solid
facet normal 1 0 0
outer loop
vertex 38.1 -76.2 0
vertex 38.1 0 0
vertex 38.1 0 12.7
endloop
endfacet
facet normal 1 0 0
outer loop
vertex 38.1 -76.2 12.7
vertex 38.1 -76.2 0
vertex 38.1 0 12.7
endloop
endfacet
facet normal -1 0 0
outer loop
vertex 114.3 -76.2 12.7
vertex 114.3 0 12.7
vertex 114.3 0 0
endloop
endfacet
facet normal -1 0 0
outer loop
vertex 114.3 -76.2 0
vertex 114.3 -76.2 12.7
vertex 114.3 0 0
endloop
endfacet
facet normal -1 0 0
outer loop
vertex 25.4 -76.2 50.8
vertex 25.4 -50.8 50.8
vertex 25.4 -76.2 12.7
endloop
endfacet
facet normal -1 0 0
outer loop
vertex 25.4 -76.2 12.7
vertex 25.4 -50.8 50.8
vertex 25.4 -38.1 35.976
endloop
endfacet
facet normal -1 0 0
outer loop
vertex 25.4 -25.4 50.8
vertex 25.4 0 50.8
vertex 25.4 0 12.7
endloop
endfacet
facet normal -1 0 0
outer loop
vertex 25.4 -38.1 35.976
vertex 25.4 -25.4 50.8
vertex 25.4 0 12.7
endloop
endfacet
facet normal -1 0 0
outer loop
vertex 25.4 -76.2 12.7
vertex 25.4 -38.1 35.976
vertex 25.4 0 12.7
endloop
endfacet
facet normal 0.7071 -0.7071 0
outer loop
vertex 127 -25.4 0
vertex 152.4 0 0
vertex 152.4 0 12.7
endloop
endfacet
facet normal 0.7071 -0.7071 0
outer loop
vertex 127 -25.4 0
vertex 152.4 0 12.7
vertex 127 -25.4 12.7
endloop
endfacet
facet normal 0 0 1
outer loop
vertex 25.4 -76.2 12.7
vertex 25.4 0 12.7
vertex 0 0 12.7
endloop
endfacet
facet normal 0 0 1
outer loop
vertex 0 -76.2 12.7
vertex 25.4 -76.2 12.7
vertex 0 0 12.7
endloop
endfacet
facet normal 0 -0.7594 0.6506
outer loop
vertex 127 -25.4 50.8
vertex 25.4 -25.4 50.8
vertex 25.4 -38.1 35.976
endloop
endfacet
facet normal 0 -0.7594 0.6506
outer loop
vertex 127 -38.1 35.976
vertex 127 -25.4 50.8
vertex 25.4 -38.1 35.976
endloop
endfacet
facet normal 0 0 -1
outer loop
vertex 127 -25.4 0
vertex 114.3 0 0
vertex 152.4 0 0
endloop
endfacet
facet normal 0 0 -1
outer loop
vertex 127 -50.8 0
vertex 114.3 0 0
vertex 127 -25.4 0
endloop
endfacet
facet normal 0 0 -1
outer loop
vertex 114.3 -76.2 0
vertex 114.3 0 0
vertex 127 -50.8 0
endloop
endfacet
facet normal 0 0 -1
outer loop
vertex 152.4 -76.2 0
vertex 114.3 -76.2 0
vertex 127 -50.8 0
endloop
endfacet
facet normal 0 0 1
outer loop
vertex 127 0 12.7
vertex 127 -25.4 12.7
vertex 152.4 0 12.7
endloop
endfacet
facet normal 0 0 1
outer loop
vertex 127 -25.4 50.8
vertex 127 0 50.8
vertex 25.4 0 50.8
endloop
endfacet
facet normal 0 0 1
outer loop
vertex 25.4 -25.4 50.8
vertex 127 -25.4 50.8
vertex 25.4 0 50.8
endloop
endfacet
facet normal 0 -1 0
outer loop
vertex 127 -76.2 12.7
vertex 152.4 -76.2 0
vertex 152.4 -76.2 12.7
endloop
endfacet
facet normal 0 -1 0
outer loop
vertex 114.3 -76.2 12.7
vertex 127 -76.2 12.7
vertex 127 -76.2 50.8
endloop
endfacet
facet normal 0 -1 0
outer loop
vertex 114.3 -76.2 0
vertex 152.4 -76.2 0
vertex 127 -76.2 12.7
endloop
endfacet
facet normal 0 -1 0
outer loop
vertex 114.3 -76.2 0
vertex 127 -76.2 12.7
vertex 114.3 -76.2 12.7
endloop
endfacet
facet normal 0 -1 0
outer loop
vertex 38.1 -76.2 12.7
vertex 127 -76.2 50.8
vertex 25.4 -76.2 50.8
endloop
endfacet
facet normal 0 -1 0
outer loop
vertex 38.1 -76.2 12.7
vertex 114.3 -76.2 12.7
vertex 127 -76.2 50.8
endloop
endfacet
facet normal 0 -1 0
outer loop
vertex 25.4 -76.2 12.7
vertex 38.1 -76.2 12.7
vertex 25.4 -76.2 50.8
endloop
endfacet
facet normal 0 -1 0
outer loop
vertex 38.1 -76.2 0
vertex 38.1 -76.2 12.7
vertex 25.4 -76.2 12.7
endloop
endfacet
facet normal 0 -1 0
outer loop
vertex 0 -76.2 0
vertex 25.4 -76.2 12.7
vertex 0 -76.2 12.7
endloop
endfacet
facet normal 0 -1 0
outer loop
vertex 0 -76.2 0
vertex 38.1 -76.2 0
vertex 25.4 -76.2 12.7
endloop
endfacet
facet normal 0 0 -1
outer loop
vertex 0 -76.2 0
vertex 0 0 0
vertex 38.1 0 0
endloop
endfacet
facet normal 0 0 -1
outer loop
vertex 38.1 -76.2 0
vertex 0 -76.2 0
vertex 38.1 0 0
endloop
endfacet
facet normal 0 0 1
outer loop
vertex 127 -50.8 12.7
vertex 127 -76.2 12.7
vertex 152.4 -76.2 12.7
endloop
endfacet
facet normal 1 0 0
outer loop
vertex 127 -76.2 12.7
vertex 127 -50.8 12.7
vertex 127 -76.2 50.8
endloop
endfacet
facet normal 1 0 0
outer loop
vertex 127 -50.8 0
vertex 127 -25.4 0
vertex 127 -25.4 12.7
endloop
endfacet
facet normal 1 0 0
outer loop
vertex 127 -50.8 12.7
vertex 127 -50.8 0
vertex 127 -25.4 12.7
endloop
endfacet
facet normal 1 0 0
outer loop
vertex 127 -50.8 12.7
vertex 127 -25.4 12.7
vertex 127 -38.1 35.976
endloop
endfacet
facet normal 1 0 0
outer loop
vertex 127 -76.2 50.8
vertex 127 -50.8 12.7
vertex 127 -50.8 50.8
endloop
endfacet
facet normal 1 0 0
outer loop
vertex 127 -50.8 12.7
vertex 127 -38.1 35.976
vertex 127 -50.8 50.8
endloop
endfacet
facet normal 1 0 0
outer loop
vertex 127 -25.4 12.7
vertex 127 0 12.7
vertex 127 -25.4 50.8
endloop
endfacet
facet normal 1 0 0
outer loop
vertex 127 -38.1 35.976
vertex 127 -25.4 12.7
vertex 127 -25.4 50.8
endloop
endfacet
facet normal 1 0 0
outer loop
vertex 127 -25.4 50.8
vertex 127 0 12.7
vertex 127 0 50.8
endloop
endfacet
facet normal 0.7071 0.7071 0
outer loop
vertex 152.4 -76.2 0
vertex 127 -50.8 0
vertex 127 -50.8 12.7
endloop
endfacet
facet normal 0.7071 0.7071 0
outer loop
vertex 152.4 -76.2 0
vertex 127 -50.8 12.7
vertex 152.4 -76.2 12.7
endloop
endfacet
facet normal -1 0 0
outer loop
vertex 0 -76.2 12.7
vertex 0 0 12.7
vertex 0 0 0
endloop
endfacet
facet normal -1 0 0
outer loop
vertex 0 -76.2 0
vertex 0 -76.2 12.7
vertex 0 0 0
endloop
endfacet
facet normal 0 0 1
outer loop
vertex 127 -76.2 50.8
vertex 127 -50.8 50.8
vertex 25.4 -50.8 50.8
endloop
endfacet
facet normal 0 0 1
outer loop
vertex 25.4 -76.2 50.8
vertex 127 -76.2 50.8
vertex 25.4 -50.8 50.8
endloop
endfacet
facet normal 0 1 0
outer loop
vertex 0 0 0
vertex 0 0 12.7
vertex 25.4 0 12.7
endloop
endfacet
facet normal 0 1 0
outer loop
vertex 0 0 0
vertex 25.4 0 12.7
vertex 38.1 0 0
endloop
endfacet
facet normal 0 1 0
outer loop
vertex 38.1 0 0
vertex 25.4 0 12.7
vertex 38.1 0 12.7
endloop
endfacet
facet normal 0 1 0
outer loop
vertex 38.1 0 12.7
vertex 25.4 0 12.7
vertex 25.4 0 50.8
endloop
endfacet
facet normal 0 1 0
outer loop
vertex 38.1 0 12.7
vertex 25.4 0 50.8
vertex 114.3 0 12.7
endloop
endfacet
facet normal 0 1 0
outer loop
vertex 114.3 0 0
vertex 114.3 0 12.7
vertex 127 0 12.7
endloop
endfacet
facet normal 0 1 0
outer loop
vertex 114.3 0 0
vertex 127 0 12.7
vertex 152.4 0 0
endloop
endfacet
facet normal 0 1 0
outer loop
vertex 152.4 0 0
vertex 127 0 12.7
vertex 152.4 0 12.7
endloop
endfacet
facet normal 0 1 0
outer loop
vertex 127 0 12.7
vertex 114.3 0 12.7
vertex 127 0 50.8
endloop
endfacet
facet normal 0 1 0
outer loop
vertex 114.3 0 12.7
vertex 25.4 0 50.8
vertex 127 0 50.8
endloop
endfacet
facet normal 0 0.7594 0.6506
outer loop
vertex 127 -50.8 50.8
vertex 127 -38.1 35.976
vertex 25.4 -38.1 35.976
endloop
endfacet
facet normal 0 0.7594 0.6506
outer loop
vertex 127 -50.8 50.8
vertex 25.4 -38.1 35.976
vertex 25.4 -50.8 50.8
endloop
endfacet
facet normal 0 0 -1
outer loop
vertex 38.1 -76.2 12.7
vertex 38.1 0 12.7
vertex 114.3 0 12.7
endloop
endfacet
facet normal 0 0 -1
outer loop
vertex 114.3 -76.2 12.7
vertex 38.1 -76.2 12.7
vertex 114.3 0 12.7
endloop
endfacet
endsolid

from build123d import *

# Parameters (mm, degrees)
F1_DEPTH = 76.2
F3_DEPTH = 152.4
F5_DEPTH = 12.7


with BuildPart() as f1:
    # F0 (on Front) → F1 (new body)
    with BuildSketch(Plane.XZ):
        Polygon((0, 12.7), (0, 0), (38.1, 0), (38.1, 12.7), (114.3, 12.7), (114.3, 0), (127, 0), (127, 50.8), (25.4, 50.8), (25.4, 12.7), align=None)
    extrude(amount=F1_DEPTH)

    # F2 (on face) → F3 (cut)
    with BuildSketch(Plane(origin=(25.4, 0, 0), x_dir=(0, -1, 0), z_dir=(-1, 0, 0))):
        Polygon((50.8, 50.8), (25.4, 50.8), (38.1, 35.975717), align=None)
    extrude(amount=-F3_DEPTH, mode=Mode.SUBTRACT)

    # F4 (on face) → F5 (join)
    with BuildSketch(Plane(origin=(0, 0, 0), x_dir=(1, 0, 0), z_dir=(0, 0, -1))):
        Polygon((152.4, 76.2), (127, 76.2), (127, 50.8), align=None)
        Polygon((127, 25.4), (127, 0), (152.4, 0), align=None)
    extrude(amount=-F5_DEPTH)


solid = f1.part
